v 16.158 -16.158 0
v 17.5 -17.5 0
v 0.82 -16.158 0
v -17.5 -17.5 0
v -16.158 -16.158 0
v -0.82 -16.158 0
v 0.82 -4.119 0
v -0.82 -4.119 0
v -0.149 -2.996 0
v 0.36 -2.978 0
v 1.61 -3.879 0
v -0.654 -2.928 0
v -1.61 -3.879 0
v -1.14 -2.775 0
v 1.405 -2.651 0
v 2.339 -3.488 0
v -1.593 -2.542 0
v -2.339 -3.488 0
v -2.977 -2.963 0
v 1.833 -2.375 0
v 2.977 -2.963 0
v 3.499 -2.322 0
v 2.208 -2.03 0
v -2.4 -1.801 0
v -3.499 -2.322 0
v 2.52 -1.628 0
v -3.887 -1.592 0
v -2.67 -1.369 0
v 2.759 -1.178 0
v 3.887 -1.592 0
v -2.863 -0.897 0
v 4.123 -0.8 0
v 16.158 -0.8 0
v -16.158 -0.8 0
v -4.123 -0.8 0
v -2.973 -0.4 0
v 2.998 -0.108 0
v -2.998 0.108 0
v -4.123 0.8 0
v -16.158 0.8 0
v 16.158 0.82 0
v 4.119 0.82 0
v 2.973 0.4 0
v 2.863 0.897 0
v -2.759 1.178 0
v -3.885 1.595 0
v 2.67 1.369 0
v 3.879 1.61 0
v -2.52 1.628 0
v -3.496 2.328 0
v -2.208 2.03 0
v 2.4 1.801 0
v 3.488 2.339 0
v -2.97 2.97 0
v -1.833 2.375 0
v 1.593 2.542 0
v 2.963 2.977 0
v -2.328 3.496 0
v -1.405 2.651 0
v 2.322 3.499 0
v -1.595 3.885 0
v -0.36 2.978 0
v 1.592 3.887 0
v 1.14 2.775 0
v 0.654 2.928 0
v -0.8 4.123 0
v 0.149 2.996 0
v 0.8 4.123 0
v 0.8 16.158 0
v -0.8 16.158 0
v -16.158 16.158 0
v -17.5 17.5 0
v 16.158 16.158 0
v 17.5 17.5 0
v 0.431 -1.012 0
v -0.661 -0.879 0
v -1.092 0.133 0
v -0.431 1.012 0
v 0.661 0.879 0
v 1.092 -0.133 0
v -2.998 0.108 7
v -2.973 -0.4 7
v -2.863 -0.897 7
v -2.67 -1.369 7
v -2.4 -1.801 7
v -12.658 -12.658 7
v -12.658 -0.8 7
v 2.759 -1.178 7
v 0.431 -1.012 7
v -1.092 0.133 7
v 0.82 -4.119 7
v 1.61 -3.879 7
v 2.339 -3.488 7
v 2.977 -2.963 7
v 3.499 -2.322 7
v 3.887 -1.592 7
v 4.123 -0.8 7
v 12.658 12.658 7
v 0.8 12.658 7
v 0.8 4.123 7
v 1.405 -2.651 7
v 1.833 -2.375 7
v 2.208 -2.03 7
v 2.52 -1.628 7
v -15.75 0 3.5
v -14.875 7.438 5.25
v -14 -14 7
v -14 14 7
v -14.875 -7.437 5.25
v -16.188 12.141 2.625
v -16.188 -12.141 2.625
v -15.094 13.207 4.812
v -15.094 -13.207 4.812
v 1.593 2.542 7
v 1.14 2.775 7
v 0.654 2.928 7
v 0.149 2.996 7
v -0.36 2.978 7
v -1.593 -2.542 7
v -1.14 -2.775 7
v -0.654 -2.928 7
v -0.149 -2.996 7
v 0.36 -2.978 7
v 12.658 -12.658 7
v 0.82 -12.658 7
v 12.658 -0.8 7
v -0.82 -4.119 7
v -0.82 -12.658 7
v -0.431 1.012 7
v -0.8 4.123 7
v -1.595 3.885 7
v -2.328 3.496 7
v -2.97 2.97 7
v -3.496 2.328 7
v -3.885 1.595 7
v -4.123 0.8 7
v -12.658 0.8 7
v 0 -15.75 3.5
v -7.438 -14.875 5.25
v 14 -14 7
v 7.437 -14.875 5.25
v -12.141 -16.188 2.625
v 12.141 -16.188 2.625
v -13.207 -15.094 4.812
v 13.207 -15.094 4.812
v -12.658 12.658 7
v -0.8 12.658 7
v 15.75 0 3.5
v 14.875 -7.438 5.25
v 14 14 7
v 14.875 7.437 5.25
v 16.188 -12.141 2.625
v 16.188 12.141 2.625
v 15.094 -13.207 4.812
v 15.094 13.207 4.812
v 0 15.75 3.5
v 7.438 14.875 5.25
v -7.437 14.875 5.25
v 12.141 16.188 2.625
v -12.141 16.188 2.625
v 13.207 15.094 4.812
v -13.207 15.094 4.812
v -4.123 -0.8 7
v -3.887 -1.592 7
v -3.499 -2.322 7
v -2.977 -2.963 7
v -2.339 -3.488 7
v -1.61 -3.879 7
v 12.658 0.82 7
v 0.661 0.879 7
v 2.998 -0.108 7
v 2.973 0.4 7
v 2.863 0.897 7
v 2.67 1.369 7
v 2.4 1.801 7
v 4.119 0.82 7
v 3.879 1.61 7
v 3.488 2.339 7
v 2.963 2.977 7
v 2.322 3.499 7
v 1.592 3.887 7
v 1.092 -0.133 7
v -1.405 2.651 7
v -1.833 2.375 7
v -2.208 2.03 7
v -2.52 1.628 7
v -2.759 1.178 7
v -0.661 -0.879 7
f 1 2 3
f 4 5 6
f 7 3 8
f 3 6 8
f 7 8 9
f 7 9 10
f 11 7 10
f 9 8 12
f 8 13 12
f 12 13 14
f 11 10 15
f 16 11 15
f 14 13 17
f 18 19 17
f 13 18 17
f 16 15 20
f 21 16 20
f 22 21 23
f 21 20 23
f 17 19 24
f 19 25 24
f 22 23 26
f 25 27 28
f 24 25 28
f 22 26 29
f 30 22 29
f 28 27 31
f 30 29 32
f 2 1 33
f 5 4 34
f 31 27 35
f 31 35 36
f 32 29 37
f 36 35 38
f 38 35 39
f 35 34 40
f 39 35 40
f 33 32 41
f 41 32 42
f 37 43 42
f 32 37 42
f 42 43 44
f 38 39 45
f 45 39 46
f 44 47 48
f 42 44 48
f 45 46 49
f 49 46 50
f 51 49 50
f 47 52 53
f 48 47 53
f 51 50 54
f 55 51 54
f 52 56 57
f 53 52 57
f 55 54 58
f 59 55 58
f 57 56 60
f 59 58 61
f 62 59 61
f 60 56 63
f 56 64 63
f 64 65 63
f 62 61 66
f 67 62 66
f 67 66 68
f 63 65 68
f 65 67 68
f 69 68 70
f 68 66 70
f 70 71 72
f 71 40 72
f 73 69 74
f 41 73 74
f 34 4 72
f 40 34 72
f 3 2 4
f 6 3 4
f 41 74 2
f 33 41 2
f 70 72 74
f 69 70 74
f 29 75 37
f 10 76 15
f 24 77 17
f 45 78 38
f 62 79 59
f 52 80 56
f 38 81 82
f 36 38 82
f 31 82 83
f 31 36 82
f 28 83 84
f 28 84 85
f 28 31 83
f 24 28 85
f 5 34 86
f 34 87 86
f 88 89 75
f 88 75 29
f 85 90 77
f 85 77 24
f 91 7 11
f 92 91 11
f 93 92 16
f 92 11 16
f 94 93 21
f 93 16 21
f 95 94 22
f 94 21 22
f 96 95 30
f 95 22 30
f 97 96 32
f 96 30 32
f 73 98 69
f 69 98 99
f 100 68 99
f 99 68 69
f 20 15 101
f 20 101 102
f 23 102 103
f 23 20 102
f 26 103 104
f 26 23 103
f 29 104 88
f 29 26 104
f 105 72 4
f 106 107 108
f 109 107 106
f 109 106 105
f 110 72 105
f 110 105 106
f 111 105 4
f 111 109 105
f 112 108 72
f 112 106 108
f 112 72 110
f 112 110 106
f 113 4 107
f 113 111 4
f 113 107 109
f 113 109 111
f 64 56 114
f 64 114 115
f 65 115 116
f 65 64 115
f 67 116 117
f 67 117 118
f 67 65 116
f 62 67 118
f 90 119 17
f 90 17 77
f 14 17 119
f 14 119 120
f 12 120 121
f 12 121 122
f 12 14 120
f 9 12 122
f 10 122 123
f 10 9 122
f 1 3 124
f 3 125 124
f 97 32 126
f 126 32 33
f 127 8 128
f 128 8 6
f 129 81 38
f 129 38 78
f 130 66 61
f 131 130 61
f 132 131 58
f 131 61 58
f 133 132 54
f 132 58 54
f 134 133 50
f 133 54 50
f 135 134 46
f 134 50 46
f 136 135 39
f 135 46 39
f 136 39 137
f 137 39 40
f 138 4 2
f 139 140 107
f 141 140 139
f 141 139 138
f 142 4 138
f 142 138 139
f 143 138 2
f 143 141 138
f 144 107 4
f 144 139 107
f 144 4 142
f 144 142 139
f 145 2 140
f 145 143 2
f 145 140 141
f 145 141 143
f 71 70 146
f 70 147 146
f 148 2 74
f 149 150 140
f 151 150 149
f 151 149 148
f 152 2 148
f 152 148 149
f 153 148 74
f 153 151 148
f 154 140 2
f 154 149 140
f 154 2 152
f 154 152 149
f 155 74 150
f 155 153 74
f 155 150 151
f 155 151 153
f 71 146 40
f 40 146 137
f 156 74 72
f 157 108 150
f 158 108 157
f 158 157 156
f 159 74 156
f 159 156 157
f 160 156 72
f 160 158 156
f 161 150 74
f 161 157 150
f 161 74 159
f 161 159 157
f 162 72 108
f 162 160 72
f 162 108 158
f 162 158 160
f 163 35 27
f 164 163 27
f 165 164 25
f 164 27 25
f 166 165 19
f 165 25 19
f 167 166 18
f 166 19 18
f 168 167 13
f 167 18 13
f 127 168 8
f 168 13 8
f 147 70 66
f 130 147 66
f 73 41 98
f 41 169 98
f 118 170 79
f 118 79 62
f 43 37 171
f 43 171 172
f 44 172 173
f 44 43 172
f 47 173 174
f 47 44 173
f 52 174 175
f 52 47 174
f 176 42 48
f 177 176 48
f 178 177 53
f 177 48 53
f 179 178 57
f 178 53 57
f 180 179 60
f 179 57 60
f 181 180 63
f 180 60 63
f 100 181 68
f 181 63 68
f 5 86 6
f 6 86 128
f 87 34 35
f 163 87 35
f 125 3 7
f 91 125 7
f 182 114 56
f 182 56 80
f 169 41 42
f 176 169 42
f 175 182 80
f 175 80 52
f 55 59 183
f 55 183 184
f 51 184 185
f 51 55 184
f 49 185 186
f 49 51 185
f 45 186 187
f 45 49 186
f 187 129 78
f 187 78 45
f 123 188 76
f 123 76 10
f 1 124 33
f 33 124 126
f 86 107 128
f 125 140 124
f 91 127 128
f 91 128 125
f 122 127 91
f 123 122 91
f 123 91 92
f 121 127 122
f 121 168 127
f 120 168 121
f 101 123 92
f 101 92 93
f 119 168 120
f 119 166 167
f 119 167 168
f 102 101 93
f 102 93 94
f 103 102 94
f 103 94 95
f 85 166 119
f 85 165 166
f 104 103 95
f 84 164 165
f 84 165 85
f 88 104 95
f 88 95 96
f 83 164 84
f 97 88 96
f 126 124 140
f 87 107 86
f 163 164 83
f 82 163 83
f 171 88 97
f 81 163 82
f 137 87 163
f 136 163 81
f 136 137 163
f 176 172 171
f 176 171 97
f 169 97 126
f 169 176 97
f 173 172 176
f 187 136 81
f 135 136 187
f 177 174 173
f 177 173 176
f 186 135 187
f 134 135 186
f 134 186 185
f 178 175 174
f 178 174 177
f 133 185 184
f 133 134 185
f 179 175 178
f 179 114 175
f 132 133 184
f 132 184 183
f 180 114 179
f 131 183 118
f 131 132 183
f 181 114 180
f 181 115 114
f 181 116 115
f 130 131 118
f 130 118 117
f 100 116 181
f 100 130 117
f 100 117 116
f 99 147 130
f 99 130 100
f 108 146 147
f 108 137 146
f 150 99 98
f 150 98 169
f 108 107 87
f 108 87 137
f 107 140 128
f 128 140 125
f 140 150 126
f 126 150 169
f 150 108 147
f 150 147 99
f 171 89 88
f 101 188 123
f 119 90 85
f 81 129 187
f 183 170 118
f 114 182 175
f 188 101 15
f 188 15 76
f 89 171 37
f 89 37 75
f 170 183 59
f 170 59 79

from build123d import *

# Parameters (mm, degrees)
F0_W       = 35
F0_H       = 35
F2_W       = 28
F2_H       = 28
F4_T       = -1.2
F5_R       = 3
F6_DEPTH   = 7
F7_SIZE2   = 3
F7_SIZE    = 6
F7_2_SIZE2 = 3
F7_2_SIZE  = 6
F7_3_SIZE2 = 3
F7_3_SIZE  = 6
F7_4_SIZE2 = 3
F7_4_SIZE  = 6
F10_DEPTH  = 7


# Not quite as in the source:
# - a feature names something its author has since deleted; it is built from what else it names


with BuildPart() as f3:
    # F0 (on Top) → F3 section 0
    with BuildSketch(Plane.XY):
        Rectangle(F0_W, F0_H)
    # F2 (on offset) → F3 section 1
    with BuildSketch(Plane.XY.offset(7)):
        Rectangle(F2_W, F2_H)
    loft()

    # F4
    f4_openings = [f3.faces().sort_by_distance(p)[0] for p in [
        (0, 0, 7),
        (0, 0, 0),
    ]]
    offset(amount=F4_T, openings=f4_openings)


with BuildPart() as f6:
    # F5 (on Top) → F6 (new body, through all)
    with BuildSketch(Plane.XY):
        with BuildLine():
            Line((-16.2, -0.8), (-4.1231056256, -0.8))
            ThreePointArc((-4.1231056256, -0.8), (-2.9768706674, -2.9628096513), (-0.8195121951, -4.1192717514))
            Line((-0.8195121951, -4.1192717514), (-0.8195121951, -16.2))
            Line((-0.8195121951, -16.2), (0.8195121951, -16.2))
            Line((0.8195121951, -16.2), (0.8195121951, -4.1192717514))
            ThreePointArc((0.8195121951, -4.1192717514), (2.9768706674, -2.9628096513), (4.1231056256, -0.8))
            Line((4.1231056256, -0.8), (16.2, -0.8))
            Line((16.2, -0.8), (16.2, 0.8195121951))
            Line((16.2, 0.8195121951), (4.1192717514, 0.8195121951))
            ThreePointArc((4.1192717514, 0.8195121951), (2.9628096513, 2.9768706674), (0.8, 4.1231056256))
            Line((0.8, 4.1231056256), (0.8, 16.2))
            Line((0.8, 16.2), (-0.8, 16.2))
            Line((-0.8, 16.2), (-0.8, 4.1231056256))
            ThreePointArc((-0.8, 4.1231056256), (-2.969848481, 2.969848481), (-4.1231056256, 0.8))
            Line((-4.1231056256, 0.8), (-16.2, 0.8))
            Line((-16.2, 0.8), (-16.2, -0.8))
        make_face()
        Circle(F5_R, mode=Mode.SUBTRACT)
    extrude(amount=F6_DEPTH)

    # F7
    f7_edges = [f6.edges().sort_by_distance(p)[0] for p in [
        (-16.2, 0, 7),
    ]]
    f7_side = f6.faces().sort_by_distance((-16.2, 0, 3.5))[0]
    chamfer(f7_edges, length=F7_SIZE, length2=F7_SIZE2, reference=f7_side)

    # F7#2
    f7_2_edges = [f6.edges().sort_by_distance(p)[0] for p in [
        (0, 16.2, 7),
    ]]
    f7_2_side = f6.faces().sort_by_distance((0, 16.2, 3.5))[0]
    chamfer(f7_2_edges, length=F7_2_SIZE, length2=F7_2_SIZE2, reference=f7_2_side)

    # F7#3
    f7_3_edges = [f6.edges().sort_by_distance(p)[0] for p in [
        (16.2, 0.009756, 7),
    ]]
    f7_3_side = f6.faces().sort_by_distance((16.2, 0.009756, 3.5))[0]
    chamfer(f7_3_edges, length=F7_3_SIZE, length2=F7_3_SIZE2, reference=f7_3_side)

    # F7#4
    f7_4_edges = [f6.edges().sort_by_distance(p)[0] for p in [
        (0, -16.2, 7),
    ]]
    f7_4_side = f6.faces().sort_by_distance((0, -16.2, 3.5))[0]
    chamfer(f7_4_edges, length=F7_4_SIZE, length2=F7_4_SIZE2, reference=f7_4_side)


with BuildPart() as f3_1:
    add(f3.part)

    # F8: union F6
    add(f6.part)

    # F9 (on face) → F10 (join, through all)
    with BuildSketch(Plane.XY.offset(7)):
        with BuildLine():
            Line((0.6612347815, 0.8790725588), (-0.3595485903, 2.9783762038))
            ThreePointArc((-0.3595485903, 2.9783762038), (-0.8973940811, 2.8626358244), (-1.4050598491, 2.6506238549))
            Line((-1.4050598491, 2.6506238549), (0.6612347815, 0.8790725588))
        make_face()
        with BuildLine():
            Line((-0.430681777, 1.0121823981), (-2.7591237497, 1.1778098887))
            ThreePointArc((-2.7591237497, 1.1778098887), (-2.9278123863, 0.6541518408), (-2.9980375188, 0.1084944043))
            Line((-2.9980375188, 0.1084944043), (-0.430681777, 1.0121823981))
        make_face()
        with BuildLine():
            Line((-1.0919165585, 0.1331098393), (-2.3995751593, -1.800566315))
            ThreePointArc((-2.3995751593, -1.800566315), (-2.0304183052, -2.2084839836), (-1.5929776697, -2.5421294507))
            Line((-1.5929776697, -2.5421294507), (-1.0919165585, 0.1331098393))
        make_face()
        with BuildLine():
            Line((-0.6612347815, -0.8790725588), (0.3595485903, -2.9783762038))
            ThreePointArc((0.3595485903, -2.9783762038), (0.8973940811, -2.8626358244), (1.4050598491, -2.6506238549))
            Line((1.4050598491, -2.6506238549), (-0.6612347815, -0.8790725588))
        make_face()
        with BuildLine():
            ThreePointArc((2.7591237497, -1.1778098887), (2.9278123863, -0.6541518408), (2.9980375188, -0.1084944043))
            Line((2.9980375188, -0.1084944043), (0.430681777, -1.0121823981))
            Line((0.430681777, -1.0121823981), (2.7591237497, -1.1778098887))
        make_face()
        with BuildLine():
            ThreePointArc((2.3995751593, 1.800566315), (2.0304183052, 2.2084839836), (1.5929776697, 2.5421294507))
            Line((1.5929776697, 2.5421294507), (1.0919165585, -0.1331098393))
            Line((1.0919165585, -0.1331098393), (2.3995751593, 1.800566315))
        make_face()
    extrude(amount=-F10_DEPTH)


solid = f3_1.part
